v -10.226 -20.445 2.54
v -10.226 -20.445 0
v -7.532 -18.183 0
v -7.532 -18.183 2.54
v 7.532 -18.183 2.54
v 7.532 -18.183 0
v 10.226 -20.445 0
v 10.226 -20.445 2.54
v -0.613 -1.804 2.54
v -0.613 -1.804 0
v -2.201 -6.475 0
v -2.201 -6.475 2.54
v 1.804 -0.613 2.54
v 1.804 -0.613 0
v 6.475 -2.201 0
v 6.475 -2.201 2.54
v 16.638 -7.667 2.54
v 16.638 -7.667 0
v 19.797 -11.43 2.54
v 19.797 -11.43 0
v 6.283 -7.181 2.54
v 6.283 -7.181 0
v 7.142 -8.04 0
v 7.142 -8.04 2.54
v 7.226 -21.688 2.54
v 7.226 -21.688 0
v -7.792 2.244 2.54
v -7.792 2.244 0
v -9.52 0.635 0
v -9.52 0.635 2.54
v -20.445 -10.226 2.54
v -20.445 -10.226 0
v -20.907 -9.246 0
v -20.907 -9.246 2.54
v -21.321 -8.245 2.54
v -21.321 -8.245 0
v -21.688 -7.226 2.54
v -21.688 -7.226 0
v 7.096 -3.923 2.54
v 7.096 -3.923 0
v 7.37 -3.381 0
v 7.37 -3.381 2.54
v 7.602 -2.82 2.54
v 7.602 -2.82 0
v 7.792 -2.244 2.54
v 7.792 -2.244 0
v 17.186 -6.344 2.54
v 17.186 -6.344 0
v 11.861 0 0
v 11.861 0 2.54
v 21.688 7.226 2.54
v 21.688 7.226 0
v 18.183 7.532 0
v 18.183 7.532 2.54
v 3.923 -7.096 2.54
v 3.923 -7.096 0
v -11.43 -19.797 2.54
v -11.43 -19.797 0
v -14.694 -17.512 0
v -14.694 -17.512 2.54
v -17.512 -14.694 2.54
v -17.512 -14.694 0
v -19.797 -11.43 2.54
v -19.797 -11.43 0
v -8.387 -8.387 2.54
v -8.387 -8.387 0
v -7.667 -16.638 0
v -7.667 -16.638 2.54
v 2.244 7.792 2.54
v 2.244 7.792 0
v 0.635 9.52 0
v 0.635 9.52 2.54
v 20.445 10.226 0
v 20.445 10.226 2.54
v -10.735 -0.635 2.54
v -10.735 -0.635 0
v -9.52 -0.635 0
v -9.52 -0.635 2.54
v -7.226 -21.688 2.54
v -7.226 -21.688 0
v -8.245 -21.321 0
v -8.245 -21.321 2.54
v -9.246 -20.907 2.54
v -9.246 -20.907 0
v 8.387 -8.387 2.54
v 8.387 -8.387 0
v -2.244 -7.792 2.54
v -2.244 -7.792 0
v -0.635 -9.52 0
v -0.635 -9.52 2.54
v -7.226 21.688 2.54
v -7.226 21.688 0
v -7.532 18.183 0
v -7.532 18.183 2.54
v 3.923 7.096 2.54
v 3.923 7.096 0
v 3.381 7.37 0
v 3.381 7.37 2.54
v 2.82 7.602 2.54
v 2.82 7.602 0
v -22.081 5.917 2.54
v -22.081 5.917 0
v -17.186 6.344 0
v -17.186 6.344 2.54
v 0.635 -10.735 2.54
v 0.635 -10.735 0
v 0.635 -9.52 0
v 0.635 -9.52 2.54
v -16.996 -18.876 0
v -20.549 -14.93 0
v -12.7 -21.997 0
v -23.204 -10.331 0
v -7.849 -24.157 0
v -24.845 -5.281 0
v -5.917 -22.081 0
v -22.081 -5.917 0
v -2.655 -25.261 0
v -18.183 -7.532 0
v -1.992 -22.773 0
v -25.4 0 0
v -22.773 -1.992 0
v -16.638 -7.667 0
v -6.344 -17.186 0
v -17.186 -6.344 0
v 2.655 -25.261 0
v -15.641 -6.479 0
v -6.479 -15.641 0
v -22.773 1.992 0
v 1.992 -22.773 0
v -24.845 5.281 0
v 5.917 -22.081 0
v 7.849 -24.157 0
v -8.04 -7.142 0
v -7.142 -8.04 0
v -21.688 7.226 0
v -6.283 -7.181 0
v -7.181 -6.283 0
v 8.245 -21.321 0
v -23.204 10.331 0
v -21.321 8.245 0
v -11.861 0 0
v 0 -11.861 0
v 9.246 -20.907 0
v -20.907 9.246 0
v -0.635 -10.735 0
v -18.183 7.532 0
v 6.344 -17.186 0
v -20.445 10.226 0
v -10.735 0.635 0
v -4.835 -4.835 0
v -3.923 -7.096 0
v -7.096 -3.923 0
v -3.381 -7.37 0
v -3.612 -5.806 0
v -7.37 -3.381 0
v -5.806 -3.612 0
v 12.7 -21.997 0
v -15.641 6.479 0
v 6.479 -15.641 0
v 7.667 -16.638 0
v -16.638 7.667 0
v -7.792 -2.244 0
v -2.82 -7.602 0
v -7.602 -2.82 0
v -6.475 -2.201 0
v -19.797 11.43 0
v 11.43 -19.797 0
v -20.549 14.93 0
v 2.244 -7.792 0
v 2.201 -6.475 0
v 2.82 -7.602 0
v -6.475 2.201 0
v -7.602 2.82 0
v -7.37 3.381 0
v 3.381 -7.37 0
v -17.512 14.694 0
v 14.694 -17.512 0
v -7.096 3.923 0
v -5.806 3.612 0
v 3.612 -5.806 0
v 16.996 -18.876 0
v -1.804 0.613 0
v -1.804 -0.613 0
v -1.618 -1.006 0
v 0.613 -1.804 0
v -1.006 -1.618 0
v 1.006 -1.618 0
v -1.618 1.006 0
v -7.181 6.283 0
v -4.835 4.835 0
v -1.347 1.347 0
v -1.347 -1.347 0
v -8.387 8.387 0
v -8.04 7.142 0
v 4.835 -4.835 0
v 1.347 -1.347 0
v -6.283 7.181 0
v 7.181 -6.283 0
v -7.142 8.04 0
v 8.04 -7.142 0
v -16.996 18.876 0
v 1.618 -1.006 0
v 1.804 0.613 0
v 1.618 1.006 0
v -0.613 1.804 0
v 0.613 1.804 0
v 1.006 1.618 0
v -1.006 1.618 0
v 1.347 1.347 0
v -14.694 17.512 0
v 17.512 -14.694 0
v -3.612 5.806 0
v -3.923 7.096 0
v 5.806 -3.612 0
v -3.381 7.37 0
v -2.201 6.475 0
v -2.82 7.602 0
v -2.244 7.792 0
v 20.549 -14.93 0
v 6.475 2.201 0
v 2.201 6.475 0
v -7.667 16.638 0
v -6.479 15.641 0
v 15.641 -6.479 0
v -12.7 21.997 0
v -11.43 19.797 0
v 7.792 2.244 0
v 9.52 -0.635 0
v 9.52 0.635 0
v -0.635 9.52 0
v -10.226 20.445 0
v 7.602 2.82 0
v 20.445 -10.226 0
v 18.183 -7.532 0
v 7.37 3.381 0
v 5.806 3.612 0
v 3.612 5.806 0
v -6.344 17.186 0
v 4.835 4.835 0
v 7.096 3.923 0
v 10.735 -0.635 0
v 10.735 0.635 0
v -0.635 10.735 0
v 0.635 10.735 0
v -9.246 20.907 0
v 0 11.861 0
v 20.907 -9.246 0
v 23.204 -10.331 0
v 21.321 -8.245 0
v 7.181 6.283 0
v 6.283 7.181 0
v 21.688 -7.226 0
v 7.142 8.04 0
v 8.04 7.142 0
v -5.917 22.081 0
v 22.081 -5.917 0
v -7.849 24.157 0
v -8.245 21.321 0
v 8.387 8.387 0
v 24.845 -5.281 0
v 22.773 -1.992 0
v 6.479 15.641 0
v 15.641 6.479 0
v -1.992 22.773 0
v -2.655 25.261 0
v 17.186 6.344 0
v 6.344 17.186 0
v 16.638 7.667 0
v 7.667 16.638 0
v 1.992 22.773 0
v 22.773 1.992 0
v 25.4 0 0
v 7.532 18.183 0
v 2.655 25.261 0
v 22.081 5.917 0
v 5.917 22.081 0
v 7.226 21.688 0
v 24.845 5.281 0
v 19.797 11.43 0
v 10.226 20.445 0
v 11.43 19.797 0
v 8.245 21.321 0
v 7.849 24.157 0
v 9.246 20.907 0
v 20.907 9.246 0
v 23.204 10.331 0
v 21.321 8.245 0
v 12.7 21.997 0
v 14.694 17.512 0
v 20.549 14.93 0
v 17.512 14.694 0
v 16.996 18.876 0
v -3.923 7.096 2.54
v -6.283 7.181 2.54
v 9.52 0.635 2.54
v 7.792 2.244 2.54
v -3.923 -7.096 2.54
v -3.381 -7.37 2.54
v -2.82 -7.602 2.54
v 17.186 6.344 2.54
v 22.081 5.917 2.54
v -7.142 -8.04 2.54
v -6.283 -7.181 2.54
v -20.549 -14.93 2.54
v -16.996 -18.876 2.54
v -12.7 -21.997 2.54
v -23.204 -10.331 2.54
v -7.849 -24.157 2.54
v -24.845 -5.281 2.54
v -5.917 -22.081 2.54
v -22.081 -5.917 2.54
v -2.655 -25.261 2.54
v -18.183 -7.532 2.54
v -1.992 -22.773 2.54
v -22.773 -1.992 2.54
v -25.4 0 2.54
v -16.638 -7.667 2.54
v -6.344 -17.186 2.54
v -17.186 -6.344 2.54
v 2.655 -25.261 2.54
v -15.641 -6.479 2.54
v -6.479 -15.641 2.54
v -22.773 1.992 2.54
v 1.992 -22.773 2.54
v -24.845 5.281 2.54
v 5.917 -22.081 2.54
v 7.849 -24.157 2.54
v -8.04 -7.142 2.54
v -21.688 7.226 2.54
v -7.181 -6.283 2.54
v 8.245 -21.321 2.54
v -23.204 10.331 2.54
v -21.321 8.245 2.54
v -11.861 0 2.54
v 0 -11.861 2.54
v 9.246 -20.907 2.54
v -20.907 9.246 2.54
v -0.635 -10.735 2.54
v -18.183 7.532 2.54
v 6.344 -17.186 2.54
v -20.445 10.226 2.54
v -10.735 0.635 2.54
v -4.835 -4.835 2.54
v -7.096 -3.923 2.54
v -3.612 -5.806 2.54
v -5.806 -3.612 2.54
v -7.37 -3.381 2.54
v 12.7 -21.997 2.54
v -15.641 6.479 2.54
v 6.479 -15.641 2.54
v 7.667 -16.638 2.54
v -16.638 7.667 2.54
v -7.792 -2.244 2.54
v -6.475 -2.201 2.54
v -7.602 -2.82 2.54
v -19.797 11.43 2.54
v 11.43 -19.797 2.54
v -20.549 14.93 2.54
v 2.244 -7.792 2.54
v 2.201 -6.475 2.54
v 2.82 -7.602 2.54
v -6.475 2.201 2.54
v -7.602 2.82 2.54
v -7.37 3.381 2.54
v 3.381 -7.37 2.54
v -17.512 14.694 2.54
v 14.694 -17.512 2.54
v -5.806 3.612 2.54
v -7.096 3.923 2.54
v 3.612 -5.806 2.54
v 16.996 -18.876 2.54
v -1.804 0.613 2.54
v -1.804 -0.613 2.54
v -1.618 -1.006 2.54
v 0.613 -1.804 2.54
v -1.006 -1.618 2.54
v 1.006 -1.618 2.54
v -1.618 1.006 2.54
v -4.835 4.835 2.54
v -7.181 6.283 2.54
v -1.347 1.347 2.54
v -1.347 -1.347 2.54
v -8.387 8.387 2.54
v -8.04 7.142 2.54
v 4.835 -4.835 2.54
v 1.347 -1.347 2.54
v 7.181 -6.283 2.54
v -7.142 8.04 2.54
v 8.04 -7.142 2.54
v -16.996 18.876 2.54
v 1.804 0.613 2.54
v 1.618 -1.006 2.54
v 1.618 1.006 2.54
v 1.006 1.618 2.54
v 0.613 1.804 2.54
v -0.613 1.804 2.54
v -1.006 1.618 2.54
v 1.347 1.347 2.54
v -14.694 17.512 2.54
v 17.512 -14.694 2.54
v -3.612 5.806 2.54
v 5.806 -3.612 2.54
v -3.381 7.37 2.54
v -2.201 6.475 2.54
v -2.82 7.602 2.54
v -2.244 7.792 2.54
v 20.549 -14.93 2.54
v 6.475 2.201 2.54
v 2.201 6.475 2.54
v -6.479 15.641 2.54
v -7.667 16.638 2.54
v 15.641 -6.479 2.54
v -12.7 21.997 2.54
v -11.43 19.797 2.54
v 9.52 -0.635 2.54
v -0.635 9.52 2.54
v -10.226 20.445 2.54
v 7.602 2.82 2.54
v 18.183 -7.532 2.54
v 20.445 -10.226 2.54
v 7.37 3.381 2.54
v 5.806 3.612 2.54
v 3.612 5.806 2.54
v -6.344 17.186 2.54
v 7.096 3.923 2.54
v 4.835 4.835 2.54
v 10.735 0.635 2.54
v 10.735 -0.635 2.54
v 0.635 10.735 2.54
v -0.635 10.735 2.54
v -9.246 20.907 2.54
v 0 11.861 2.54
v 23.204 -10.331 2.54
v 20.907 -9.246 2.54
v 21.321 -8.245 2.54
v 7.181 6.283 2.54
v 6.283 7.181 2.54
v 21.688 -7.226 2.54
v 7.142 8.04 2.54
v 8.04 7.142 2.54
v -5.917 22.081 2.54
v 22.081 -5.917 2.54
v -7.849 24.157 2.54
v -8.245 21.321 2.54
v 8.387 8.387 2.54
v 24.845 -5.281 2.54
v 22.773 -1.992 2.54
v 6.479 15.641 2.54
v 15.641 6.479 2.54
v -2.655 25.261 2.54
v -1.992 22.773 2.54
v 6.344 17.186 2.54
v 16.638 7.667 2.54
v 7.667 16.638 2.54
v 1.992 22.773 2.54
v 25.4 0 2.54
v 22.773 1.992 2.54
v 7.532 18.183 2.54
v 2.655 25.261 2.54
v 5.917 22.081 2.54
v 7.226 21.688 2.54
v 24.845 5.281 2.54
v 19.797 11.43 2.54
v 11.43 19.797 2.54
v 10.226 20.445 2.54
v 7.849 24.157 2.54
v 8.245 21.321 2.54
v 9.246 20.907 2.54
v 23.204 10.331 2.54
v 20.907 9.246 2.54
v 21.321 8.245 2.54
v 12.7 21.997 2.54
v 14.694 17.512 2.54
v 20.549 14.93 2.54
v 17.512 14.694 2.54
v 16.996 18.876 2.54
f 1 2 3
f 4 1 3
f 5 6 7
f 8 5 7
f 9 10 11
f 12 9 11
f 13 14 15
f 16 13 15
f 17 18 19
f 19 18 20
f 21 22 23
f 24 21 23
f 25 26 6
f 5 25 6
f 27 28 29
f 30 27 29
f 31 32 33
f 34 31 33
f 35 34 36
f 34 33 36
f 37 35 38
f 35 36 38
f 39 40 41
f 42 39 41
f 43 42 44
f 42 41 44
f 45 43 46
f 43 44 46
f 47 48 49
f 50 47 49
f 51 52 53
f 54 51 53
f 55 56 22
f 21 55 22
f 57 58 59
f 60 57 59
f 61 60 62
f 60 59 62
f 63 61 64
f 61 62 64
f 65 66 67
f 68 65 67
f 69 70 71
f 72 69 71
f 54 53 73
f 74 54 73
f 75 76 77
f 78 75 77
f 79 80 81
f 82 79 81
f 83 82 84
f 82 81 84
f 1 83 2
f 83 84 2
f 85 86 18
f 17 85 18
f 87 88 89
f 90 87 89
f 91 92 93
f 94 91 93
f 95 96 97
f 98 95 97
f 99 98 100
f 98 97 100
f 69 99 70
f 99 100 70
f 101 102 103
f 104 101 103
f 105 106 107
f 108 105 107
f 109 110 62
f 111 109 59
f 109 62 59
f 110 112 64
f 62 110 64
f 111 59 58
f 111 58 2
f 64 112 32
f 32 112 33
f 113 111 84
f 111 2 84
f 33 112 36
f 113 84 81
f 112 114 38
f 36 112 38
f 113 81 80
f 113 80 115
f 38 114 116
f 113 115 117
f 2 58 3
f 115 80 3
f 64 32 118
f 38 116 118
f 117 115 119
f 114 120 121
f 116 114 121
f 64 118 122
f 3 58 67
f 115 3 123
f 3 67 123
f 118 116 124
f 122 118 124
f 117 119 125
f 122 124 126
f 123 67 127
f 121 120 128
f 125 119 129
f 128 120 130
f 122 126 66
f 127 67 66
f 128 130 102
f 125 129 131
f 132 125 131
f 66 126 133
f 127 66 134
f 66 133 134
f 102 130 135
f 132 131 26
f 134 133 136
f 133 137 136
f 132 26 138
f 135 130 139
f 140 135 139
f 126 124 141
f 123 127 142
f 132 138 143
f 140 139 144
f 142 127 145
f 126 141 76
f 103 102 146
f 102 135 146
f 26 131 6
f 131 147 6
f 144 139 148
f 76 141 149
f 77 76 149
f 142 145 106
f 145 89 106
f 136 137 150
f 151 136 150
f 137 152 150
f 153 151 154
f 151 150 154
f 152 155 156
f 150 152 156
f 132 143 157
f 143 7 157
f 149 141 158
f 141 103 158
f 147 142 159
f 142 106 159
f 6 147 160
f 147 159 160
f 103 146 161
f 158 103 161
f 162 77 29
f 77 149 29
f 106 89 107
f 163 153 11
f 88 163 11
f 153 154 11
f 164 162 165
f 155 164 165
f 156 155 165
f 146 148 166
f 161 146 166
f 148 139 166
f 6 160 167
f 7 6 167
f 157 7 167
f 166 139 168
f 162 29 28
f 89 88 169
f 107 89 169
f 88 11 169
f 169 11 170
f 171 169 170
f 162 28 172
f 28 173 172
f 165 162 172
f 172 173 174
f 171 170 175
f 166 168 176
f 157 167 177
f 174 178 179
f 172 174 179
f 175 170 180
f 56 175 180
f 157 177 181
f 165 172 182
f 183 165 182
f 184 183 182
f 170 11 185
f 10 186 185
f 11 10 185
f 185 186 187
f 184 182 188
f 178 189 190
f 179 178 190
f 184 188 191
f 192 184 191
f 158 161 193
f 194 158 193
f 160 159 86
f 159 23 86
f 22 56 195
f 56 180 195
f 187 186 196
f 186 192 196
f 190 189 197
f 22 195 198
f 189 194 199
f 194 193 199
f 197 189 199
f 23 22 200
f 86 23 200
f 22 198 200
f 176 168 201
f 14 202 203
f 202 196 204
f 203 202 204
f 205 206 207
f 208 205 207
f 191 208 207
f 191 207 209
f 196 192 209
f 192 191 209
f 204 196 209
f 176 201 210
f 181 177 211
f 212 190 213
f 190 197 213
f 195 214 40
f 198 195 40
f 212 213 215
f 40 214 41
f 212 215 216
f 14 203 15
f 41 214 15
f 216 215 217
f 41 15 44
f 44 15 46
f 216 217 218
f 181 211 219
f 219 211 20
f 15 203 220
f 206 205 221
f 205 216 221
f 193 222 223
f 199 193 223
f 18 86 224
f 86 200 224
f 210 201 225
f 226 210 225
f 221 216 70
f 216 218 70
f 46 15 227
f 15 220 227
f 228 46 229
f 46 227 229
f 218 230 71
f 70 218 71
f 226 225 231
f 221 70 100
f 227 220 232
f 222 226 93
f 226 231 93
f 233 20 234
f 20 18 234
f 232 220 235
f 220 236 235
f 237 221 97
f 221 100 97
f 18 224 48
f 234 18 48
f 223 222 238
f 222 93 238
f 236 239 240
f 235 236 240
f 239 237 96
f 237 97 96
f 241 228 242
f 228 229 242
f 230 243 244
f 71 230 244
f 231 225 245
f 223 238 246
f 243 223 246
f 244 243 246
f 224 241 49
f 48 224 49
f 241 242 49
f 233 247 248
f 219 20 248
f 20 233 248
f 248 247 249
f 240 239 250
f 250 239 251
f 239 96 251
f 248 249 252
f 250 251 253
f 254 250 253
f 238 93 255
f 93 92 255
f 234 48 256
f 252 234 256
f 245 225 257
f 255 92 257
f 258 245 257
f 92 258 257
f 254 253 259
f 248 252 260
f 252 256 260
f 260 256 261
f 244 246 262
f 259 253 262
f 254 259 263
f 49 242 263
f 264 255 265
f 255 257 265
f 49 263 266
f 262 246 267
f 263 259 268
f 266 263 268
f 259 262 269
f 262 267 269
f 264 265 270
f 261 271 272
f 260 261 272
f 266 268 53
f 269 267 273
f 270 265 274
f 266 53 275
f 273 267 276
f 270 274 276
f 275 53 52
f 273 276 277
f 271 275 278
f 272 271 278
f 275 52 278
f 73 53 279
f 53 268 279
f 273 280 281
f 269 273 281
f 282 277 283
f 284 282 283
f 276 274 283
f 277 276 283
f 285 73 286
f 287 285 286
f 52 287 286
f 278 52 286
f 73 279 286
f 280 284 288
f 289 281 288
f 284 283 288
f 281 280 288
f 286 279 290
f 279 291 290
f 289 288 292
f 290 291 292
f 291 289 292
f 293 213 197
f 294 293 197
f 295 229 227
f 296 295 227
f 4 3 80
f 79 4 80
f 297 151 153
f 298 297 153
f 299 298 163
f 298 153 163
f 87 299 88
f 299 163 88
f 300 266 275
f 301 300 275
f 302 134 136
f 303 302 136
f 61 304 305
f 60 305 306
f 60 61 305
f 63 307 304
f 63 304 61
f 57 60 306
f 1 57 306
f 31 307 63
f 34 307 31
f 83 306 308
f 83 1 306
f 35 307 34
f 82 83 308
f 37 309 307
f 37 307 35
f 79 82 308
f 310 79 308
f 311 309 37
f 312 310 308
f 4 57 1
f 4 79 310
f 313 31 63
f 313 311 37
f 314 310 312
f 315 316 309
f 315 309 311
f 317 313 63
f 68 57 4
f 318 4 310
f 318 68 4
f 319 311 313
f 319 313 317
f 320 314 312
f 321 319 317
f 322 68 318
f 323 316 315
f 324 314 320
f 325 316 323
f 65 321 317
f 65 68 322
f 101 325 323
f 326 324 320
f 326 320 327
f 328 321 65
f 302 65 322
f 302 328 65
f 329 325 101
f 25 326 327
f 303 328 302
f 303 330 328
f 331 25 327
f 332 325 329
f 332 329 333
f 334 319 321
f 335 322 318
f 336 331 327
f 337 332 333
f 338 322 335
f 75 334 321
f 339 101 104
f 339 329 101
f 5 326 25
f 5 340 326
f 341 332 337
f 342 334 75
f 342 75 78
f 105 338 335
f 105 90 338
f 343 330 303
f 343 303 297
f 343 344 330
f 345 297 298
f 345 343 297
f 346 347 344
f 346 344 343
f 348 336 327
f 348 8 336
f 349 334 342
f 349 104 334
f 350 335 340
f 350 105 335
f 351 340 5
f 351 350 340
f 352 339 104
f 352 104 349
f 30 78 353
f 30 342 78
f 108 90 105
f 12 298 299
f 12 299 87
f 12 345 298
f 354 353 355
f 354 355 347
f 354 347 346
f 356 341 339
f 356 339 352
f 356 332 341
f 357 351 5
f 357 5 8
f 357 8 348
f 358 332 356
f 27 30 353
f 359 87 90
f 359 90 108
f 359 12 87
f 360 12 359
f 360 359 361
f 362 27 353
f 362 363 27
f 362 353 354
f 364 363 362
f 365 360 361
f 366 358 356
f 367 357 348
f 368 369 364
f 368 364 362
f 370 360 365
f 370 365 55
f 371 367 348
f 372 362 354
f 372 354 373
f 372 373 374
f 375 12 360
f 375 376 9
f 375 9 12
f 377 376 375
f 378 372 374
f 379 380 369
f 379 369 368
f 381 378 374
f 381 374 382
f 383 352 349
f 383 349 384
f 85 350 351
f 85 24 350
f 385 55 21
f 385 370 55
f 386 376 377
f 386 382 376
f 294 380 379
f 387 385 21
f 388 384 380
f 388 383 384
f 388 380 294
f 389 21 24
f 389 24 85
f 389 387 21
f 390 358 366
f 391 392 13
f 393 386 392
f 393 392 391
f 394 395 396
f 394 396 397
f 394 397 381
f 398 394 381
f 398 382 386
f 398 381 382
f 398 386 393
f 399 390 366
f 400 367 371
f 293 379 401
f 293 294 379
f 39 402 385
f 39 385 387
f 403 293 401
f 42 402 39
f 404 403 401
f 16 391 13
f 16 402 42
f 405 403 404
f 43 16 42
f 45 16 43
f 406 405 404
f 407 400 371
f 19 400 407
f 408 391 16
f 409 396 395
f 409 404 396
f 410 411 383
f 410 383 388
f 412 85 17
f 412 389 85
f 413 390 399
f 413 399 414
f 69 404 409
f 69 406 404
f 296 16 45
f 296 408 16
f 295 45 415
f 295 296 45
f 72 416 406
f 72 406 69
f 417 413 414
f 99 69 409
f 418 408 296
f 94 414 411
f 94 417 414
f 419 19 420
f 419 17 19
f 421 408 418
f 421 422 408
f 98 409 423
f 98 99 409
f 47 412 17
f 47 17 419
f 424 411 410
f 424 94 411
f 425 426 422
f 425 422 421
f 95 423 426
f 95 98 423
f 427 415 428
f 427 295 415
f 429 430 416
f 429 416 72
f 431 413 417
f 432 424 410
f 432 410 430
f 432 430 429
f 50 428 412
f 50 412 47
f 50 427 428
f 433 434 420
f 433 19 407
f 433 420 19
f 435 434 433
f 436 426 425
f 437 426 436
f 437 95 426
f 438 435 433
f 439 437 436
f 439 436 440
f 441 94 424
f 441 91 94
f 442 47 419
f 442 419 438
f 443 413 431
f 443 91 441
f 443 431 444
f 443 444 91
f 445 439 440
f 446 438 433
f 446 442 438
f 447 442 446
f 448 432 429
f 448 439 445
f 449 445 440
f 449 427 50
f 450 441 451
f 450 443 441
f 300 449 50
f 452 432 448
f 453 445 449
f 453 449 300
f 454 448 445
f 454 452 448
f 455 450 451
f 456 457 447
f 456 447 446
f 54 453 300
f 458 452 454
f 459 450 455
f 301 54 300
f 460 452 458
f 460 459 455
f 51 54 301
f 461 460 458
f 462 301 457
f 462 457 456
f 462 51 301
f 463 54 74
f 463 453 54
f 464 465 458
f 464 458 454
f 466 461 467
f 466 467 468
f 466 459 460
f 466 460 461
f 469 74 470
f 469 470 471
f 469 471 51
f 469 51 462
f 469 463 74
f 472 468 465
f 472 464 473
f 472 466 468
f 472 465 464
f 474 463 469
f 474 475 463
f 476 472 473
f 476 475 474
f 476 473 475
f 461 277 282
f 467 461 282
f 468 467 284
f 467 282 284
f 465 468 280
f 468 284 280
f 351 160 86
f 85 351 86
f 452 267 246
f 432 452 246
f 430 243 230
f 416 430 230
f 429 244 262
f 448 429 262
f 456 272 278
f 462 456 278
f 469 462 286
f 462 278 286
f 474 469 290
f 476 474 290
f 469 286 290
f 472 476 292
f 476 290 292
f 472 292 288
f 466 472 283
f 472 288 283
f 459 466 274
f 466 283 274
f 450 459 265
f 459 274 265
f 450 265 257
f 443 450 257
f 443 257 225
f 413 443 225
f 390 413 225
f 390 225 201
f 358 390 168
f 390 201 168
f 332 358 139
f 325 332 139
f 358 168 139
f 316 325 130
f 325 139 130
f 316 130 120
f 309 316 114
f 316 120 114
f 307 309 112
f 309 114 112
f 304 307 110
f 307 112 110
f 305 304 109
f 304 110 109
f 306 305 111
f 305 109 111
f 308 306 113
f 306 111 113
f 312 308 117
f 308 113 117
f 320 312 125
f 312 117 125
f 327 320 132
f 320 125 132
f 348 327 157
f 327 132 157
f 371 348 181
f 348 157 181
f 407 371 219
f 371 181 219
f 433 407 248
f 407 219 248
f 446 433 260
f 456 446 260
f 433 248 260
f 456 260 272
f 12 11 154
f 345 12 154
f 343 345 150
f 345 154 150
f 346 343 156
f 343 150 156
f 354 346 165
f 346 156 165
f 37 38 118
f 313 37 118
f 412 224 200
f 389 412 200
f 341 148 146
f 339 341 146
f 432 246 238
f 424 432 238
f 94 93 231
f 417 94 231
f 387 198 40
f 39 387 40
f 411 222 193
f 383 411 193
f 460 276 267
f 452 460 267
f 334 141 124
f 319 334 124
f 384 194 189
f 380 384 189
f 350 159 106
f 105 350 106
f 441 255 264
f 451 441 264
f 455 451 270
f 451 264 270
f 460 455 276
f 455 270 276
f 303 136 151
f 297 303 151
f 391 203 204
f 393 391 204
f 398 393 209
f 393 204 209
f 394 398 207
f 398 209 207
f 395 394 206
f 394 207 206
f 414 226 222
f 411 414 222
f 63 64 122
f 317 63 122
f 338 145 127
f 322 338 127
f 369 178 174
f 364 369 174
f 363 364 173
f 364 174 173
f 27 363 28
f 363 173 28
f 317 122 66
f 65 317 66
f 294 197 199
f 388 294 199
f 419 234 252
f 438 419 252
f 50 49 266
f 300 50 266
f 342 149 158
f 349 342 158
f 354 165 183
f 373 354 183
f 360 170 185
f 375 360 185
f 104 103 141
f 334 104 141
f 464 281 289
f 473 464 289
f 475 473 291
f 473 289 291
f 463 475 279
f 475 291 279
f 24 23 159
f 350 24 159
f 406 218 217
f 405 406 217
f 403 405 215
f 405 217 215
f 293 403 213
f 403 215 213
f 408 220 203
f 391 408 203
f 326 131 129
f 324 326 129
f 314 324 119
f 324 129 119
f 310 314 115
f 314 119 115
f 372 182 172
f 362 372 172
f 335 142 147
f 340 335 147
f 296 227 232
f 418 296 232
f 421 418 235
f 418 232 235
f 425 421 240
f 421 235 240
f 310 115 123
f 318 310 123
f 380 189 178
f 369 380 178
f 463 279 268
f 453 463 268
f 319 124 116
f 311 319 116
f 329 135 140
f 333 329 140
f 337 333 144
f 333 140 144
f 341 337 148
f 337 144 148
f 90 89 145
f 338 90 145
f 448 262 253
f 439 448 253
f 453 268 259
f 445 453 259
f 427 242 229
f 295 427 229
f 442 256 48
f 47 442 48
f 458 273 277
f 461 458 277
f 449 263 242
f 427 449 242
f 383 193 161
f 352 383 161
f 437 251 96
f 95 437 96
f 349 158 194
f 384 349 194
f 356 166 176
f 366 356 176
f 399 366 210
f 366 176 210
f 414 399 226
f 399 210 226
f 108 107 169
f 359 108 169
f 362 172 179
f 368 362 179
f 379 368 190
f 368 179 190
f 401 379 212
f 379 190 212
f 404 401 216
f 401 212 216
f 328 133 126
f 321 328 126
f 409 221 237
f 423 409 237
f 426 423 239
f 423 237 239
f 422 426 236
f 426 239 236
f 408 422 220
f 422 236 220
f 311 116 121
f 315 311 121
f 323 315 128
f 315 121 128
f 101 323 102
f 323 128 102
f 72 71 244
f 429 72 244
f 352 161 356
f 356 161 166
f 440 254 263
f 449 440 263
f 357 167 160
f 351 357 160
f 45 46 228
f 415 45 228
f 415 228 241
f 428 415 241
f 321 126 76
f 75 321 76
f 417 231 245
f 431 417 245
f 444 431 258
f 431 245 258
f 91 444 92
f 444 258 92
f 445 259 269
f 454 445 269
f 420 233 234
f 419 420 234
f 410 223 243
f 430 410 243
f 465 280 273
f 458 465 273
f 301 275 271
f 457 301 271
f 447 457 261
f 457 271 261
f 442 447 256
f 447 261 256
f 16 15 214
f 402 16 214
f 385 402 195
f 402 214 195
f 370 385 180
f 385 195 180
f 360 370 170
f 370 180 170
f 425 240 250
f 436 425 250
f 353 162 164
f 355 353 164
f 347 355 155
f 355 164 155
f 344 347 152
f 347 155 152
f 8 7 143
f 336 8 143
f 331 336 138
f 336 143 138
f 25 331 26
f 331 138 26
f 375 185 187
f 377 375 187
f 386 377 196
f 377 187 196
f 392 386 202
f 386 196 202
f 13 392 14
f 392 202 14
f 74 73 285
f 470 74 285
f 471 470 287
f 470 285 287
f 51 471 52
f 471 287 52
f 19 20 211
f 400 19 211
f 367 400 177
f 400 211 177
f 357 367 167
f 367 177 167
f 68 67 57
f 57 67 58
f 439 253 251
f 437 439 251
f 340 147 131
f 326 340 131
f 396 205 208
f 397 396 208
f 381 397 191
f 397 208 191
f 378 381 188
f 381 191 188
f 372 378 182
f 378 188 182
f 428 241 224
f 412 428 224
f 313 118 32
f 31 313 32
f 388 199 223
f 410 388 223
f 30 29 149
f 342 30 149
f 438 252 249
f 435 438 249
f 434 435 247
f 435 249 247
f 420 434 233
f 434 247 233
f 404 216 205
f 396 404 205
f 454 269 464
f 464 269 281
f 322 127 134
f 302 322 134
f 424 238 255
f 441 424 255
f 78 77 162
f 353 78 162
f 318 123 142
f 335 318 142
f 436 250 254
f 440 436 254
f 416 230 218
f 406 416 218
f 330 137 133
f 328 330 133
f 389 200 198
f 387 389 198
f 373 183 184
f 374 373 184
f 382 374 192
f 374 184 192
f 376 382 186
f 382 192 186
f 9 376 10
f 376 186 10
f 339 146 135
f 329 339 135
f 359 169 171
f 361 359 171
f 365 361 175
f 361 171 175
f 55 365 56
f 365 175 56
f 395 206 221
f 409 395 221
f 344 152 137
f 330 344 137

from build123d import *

# Parameters (mm, degrees)
F0_R     = 25.4
F1_DEPTH = 2.54


with BuildPart() as f1:
    # F0 (on Top) → F1 (new body)
    with BuildSketch(Plane.XY):
        Circle(F0_R)
        with BuildLine():
            Line((-16.63807, -7.666502), (-8.386692, -8.386692))
            Line((-8.386692, -8.386692), (-7.666502, -16.63807))
            Line((-7.666502, -16.63807), (-11.43, -19.797341))
            ThreePointArc((-11.43, -19.797341), (-16.164461, -16.164461), (-19.797341, -11.43))
            Line((-19.797341, -11.43), (-16.63807, -7.666502))
        make_face(mode=Mode.SUBTRACT)
        with BuildLine():
            ThreePointArc((-7.225741, -21.687975), (-8.748143, -21.119886), (-10.226344, -20.445085))
            Line((-10.226344, -20.445085), (-7.531657, -18.183027))
            Line((-7.531657, -18.183027), (-7.225741, -21.687975))
        make_face(mode=Mode.SUBTRACT)
        with BuildLine():
            Line((-6.343856, -17.185928), (0, -11.860573))
            Line((0, -11.860573), (6.343856, -17.185928))
            Line((6.343856, -17.185928), (5.916603, -22.081064))
            ThreePointArc((5.916603, -22.081064), (0, -22.86), (-5.916603, -22.081064))
            Line((-5.916603, -22.081064), (-6.343856, -17.185928))
        make_face(mode=Mode.SUBTRACT)
        with BuildLine():
            Line((-21.687975, -7.225741), (-18.183027, -7.531657))
            Line((-18.183027, -7.531657), (-20.445085, -10.226344))
            ThreePointArc((-20.445085, -10.226344), (-21.119886, -8.748143), (-21.687975, -7.225741))
        make_face(mode=Mode.SUBTRACT)
        with BuildLine():
            Line((-7.142111, -8.040137), (-6.282752, -7.180777))
            Line((-6.282752, -7.180777), (-3.923092, -7.096107))
            ThreePointArc((-3.923092, -7.096107), (-3.102932, -7.491142), (-2.243661, -7.791751))
            Line((-2.243661, -7.791751), (-0.635, -9.520153))
            Line((-0.635, -9.520153), (-0.635, -10.73547))
            Line((-0.635, -10.73547), (-6.478702, -15.64097))
            Line((-6.478702, -15.64097), (-7.142111, -8.040137))
        make_face(mode=Mode.SUBTRACT)
        with BuildLine():
            Line((-10.73547, -0.635), (-9.520153, -0.635))
            Line((-9.520153, -0.635), (-7.791751, -2.243661))
            ThreePointArc((-7.791751, -2.243661), (-7.491142, -3.102932), (-7.096107, -3.923092))
            Line((-7.096107, -3.923092), (-7.180777, -6.282752))
            Line((-7.180777, -6.282752), (-8.040137, -7.142111))
            Line((-8.040137, -7.142111), (-15.64097, -6.478702))
            Line((-15.64097, -6.478702), (-10.73547, -0.635))
        make_face(mode=Mode.SUBTRACT)
        with BuildLine():
            Line((-6.474615, -2.200555), (-1.803671, -0.613021))
            ThreePointArc((-1.803671, -0.613021), (-1.347038, -1.347038), (-0.613021, -1.803671))
            Line((-0.613021, -1.803671), (-2.200555, -6.474615))
            ThreePointArc((-2.200555, -6.474615), (-4.835446, -4.835446), (-6.474615, -2.200555))
        make_face(mode=Mode.SUBTRACT)
        with BuildLine():
            ThreePointArc((10.226344, -20.445085), (8.748143, -21.119886), (7.225741, -21.687975))
            Line((7.225741, -21.687975), (7.531657, -18.183027))
            Line((7.531657, -18.183027), (10.226344, -20.445085))
        make_face(mode=Mode.SUBTRACT)
        with BuildLine():
            Line((7.666502, -16.63807), (8.386692, -8.386692))
            Line((8.386692, -8.386692), (16.63807, -7.666502))
            Line((16.63807, -7.666502), (19.797341, -11.43))
            ThreePointArc((19.797341, -11.43), (16.164461, -16.164461), (11.43, -19.797341))
            Line((11.43, -19.797341), (7.666502, -16.63807))
        make_face(mode=Mode.SUBTRACT)
        with BuildLine():
            Line((0.635, -10.73547), (0.635, -9.520153))
            Line((0.635, -9.520153), (2.243661, -7.791751))
            ThreePointArc((2.243661, -7.791751), (3.102932, -7.491142), (3.923092, -7.096107))
            Line((3.923092, -7.096107), (6.282752, -7.180777))
            Line((6.282752, -7.180777), (7.142111, -8.040137))
            Line((7.142111, -8.040137), (6.478702, -15.64097))
            Line((6.478702, -15.64097), (0.635, -10.73547))
        make_face(mode=Mode.SUBTRACT)
        with BuildLine():
            Line((2.200555, -6.474615), (0.613021, -1.803671))
            ThreePointArc((0.613021, -1.803671), (1.347038, -1.347038), (1.803671, -0.613021))
            Line((1.803671, -0.613021), (6.474615, -2.200555))
            ThreePointArc((6.474615, -2.200555), (4.835446, -4.835446), (2.200555, -6.474615))
        make_face(mode=Mode.SUBTRACT)
        with BuildLine():
            Line((8.040137, -7.142111), (7.180777, -6.282752))
            Line((7.180777, -6.282752), (7.096107, -3.923092))
            ThreePointArc((7.096107, -3.923092), (7.491142, -3.102932), (7.791751, -2.243661))
            Line((7.791751, -2.243661), (9.520153, -0.635))
            Line((9.520153, -0.635), (10.73547, -0.635))
            Line((10.73547, -0.635), (15.64097, -6.478702))
            Line((15.64097, -6.478702), (8.040137, -7.142111))
        make_face(mode=Mode.SUBTRACT)
        with BuildLine():
            ThreePointArc((21.687975, -7.225741), (21.119886, -8.748143), (20.445085, -10.226344))
            Line((20.445085, -10.226344), (18.183027, -7.531657))
            Line((18.183027, -7.531657), (21.687975, -7.225741))
        make_face(mode=Mode.SUBTRACT)
        with BuildLine():
            Line((17.185928, -6.343856), (11.860573, 0))
            Line((11.860573, 0), (17.185928, 6.343856))
            Line((17.185928, 6.343856), (22.081064, 5.916603))
            ThreePointArc((22.081064, 5.916603), (22.86, 0), (22.081064, -5.916603))
            Line((22.081064, -5.916603), (17.185928, -6.343856))
        make_face(mode=Mode.SUBTRACT)
        with BuildLine():
            Line((-17.185928, 6.343856), (-11.860573, 0))
            Line((-11.860573, 0), (-17.185928, -6.343856))
            Line((-17.185928, -6.343856), (-22.081064, -5.916603))
            ThreePointArc((-22.081064, -5.916603), (-22.86, 0), (-22.081064, 5.916603))
            Line((-22.081064, 5.916603), (-17.185928, 6.343856))
        make_face(mode=Mode.SUBTRACT)
        with BuildLine():
            Line((-20.445085, 10.226344), (-18.183027, 7.531657))
            Line((-18.183027, 7.531657), (-21.687975, 7.225741))
            ThreePointArc((-21.687975, 7.225741), (-21.119886, 8.748143), (-20.445085, 10.226344))
        make_face(mode=Mode.SUBTRACT)
        with BuildLine():
            Line((-8.040137, 7.142111), (-7.180777, 6.282752))
            Line((-7.180777, 6.282752), (-7.096107, 3.923092))
            ThreePointArc((-7.096107, 3.923092), (-7.491142, 3.102932), (-7.791751, 2.243661))
            Line((-7.791751, 2.243661), (-9.520153, 0.635))
            Line((-9.520153, 0.635), (-10.73547, 0.635))
            Line((-10.73547, 0.635), (-15.64097, 6.478702))
            Line((-15.64097, 6.478702), (-8.040137, 7.142111))
        make_face(mode=Mode.SUBTRACT)
        with BuildLine():
            Line((-2.200555, 6.474615), (-0.613021, 1.803671))
            ThreePointArc((-0.613021, 1.803671), (-1.347038, 1.347038), (-1.803671, 0.613021))
            Line((-1.803671, 0.613021), (-6.474615, 2.200555))
            ThreePointArc((-6.474615, 2.200555), (-4.835446, 4.835446), (-2.200555, 6.474615))
        make_face(mode=Mode.SUBTRACT)
        with BuildLine():
            Line((-0.635, 10.73547), (-0.635, 9.520153))
            Line((-0.635, 9.520153), (-2.243661, 7.791751))
            ThreePointArc((-2.243661, 7.791751), (-3.102932, 7.491142), (-3.923092, 7.096107))
            Line((-3.923092, 7.096107), (-6.282752, 7.180777))
            Line((-6.282752, 7.180777), (-7.142111, 8.040137))
            Line((-7.142111, 8.040137), (-6.478702, 15.64097))
            Line((-6.478702, 15.64097), (-0.635, 10.73547))
        make_face(mode=Mode.SUBTRACT)
        with BuildLine():
            ThreePointArc((-19.797341, 11.43), (-16.164461, 16.164461), (-11.43, 19.797341))
            Line((-11.43, 19.797341), (-7.666502, 16.63807))
            Line((-7.666502, 16.63807), (-8.386692, 8.386692))
            Line((-8.386692, 8.386692), (-16.63807, 7.666502))
            Line((-16.63807, 7.666502), (-19.797341, 11.43))
        make_face(mode=Mode.SUBTRACT)
        with BuildLine():
            Line((-7.225741, 21.687975), (-7.531657, 18.183027))
            Line((-7.531657, 18.183027), (-10.226344, 20.445085))
            ThreePointArc((-10.226344, 20.445085), (-8.748143, 21.119886), (-7.225741, 21.687975))
        make_face(mode=Mode.SUBTRACT)
        with BuildLine():
            ThreePointArc((1.803671, 0.613021), (1.347038, 1.347038), (0.613021, 1.803671))
            Line((0.613021, 1.803671), (2.200555, 6.474615))
            ThreePointArc((2.200555, 6.474615), (4.835446, 4.835446), (6.474615, 2.200555))
            Line((6.474615, 2.200555), (1.803671, 0.613021))
        make_face(mode=Mode.SUBTRACT)
        with BuildLine():
            Line((10.73547, 0.635), (9.520153, 0.635))
            Line((9.520153, 0.635), (7.791751, 2.243661))
            ThreePointArc((7.791751, 2.243661), (7.491142, 3.102932), (7.096107, 3.923092))
            Line((7.096107, 3.923092), (7.180777, 6.282752))
            Line((7.180777, 6.282752), (8.040137, 7.142111))
            Line((8.040137, 7.142111), (15.64097, 6.478702))
            Line((15.64097, 6.478702), (10.73547, 0.635))
        make_face(mode=Mode.SUBTRACT)
        with BuildLine():
            Line((2.243661, 7.791751), (0.635, 9.520153))
            Line((0.635, 9.520153), (0.635, 10.73547))
            Line((0.635, 10.73547), (6.478702, 15.64097))
            Line((6.478702, 15.64097), (7.142111, 8.040137))
            Line((7.142111, 8.040137), (6.282752, 7.180777))
            Line((6.282752, 7.180777), (3.923092, 7.096107))
            ThreePointArc((3.923092, 7.096107), (3.102932, 7.491142), (2.243661, 7.791751))
        make_face(mode=Mode.SUBTRACT)
        with BuildLine():
            ThreePointArc((20.445085, 10.226344), (21.119886, 8.748143), (21.687975, 7.225741))
            Line((21.687975, 7.225741), (18.183027, 7.531657))
            Line((18.183027, 7.531657), (20.445085, 10.226344))
        make_face(mode=Mode.SUBTRACT)
        with BuildLine():
            Line((6.343856, 17.185928), (0, 11.860573))
            Line((0, 11.860573), (-6.343856, 17.185928))
            Line((-6.343856, 17.185928), (-5.916603, 22.081064))
            ThreePointArc((-5.916603, 22.081064), (0, 22.86), (5.916603, 22.081064))
            Line((5.916603, 22.081064), (6.343856, 17.185928))
        make_face(mode=Mode.SUBTRACT)
        with BuildLine():
            ThreePointArc((7.225741, 21.687975), (8.748143, 21.119886), (10.226344, 20.445085))
            Line((10.226344, 20.445085), (7.531657, 18.183027))
            Line((7.531657, 18.183027), (7.225741, 21.687975))
        make_face(mode=Mode.SUBTRACT)
        with BuildLine():
            Line((16.63807, 7.666502), (8.386692, 8.386692))
            Line((8.386692, 8.386692), (7.666502, 16.63807))
            Line((7.666502, 16.63807), (11.43, 19.797341))
            ThreePointArc((11.43, 19.797341), (16.164461, 16.164461), (19.797341, 11.43))
            Line((19.797341, 11.43), (16.63807, 7.666502))
        make_face(mode=Mode.SUBTRACT)
    extrude(amount=F1_DEPTH)


solid = f1.part
